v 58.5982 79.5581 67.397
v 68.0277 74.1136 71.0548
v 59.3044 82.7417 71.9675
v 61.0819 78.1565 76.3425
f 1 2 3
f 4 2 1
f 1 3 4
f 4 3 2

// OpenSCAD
// Auto-generated auxetic polyhedron
points = [
    [59.304388, 82.741705, 71.967505],
    [68.027740, 74.113559, 71.054809],
    [58.598158, 79.558068, 67.397033],
    [61.081946, 78.156499, 76.342504],
];

faces = [
    [0, 1, 2],
    [2, 1, 3],
    [3, 0, 2],
    [1, 0, 3],
];

polyhedron(points = points, faces = faces);
